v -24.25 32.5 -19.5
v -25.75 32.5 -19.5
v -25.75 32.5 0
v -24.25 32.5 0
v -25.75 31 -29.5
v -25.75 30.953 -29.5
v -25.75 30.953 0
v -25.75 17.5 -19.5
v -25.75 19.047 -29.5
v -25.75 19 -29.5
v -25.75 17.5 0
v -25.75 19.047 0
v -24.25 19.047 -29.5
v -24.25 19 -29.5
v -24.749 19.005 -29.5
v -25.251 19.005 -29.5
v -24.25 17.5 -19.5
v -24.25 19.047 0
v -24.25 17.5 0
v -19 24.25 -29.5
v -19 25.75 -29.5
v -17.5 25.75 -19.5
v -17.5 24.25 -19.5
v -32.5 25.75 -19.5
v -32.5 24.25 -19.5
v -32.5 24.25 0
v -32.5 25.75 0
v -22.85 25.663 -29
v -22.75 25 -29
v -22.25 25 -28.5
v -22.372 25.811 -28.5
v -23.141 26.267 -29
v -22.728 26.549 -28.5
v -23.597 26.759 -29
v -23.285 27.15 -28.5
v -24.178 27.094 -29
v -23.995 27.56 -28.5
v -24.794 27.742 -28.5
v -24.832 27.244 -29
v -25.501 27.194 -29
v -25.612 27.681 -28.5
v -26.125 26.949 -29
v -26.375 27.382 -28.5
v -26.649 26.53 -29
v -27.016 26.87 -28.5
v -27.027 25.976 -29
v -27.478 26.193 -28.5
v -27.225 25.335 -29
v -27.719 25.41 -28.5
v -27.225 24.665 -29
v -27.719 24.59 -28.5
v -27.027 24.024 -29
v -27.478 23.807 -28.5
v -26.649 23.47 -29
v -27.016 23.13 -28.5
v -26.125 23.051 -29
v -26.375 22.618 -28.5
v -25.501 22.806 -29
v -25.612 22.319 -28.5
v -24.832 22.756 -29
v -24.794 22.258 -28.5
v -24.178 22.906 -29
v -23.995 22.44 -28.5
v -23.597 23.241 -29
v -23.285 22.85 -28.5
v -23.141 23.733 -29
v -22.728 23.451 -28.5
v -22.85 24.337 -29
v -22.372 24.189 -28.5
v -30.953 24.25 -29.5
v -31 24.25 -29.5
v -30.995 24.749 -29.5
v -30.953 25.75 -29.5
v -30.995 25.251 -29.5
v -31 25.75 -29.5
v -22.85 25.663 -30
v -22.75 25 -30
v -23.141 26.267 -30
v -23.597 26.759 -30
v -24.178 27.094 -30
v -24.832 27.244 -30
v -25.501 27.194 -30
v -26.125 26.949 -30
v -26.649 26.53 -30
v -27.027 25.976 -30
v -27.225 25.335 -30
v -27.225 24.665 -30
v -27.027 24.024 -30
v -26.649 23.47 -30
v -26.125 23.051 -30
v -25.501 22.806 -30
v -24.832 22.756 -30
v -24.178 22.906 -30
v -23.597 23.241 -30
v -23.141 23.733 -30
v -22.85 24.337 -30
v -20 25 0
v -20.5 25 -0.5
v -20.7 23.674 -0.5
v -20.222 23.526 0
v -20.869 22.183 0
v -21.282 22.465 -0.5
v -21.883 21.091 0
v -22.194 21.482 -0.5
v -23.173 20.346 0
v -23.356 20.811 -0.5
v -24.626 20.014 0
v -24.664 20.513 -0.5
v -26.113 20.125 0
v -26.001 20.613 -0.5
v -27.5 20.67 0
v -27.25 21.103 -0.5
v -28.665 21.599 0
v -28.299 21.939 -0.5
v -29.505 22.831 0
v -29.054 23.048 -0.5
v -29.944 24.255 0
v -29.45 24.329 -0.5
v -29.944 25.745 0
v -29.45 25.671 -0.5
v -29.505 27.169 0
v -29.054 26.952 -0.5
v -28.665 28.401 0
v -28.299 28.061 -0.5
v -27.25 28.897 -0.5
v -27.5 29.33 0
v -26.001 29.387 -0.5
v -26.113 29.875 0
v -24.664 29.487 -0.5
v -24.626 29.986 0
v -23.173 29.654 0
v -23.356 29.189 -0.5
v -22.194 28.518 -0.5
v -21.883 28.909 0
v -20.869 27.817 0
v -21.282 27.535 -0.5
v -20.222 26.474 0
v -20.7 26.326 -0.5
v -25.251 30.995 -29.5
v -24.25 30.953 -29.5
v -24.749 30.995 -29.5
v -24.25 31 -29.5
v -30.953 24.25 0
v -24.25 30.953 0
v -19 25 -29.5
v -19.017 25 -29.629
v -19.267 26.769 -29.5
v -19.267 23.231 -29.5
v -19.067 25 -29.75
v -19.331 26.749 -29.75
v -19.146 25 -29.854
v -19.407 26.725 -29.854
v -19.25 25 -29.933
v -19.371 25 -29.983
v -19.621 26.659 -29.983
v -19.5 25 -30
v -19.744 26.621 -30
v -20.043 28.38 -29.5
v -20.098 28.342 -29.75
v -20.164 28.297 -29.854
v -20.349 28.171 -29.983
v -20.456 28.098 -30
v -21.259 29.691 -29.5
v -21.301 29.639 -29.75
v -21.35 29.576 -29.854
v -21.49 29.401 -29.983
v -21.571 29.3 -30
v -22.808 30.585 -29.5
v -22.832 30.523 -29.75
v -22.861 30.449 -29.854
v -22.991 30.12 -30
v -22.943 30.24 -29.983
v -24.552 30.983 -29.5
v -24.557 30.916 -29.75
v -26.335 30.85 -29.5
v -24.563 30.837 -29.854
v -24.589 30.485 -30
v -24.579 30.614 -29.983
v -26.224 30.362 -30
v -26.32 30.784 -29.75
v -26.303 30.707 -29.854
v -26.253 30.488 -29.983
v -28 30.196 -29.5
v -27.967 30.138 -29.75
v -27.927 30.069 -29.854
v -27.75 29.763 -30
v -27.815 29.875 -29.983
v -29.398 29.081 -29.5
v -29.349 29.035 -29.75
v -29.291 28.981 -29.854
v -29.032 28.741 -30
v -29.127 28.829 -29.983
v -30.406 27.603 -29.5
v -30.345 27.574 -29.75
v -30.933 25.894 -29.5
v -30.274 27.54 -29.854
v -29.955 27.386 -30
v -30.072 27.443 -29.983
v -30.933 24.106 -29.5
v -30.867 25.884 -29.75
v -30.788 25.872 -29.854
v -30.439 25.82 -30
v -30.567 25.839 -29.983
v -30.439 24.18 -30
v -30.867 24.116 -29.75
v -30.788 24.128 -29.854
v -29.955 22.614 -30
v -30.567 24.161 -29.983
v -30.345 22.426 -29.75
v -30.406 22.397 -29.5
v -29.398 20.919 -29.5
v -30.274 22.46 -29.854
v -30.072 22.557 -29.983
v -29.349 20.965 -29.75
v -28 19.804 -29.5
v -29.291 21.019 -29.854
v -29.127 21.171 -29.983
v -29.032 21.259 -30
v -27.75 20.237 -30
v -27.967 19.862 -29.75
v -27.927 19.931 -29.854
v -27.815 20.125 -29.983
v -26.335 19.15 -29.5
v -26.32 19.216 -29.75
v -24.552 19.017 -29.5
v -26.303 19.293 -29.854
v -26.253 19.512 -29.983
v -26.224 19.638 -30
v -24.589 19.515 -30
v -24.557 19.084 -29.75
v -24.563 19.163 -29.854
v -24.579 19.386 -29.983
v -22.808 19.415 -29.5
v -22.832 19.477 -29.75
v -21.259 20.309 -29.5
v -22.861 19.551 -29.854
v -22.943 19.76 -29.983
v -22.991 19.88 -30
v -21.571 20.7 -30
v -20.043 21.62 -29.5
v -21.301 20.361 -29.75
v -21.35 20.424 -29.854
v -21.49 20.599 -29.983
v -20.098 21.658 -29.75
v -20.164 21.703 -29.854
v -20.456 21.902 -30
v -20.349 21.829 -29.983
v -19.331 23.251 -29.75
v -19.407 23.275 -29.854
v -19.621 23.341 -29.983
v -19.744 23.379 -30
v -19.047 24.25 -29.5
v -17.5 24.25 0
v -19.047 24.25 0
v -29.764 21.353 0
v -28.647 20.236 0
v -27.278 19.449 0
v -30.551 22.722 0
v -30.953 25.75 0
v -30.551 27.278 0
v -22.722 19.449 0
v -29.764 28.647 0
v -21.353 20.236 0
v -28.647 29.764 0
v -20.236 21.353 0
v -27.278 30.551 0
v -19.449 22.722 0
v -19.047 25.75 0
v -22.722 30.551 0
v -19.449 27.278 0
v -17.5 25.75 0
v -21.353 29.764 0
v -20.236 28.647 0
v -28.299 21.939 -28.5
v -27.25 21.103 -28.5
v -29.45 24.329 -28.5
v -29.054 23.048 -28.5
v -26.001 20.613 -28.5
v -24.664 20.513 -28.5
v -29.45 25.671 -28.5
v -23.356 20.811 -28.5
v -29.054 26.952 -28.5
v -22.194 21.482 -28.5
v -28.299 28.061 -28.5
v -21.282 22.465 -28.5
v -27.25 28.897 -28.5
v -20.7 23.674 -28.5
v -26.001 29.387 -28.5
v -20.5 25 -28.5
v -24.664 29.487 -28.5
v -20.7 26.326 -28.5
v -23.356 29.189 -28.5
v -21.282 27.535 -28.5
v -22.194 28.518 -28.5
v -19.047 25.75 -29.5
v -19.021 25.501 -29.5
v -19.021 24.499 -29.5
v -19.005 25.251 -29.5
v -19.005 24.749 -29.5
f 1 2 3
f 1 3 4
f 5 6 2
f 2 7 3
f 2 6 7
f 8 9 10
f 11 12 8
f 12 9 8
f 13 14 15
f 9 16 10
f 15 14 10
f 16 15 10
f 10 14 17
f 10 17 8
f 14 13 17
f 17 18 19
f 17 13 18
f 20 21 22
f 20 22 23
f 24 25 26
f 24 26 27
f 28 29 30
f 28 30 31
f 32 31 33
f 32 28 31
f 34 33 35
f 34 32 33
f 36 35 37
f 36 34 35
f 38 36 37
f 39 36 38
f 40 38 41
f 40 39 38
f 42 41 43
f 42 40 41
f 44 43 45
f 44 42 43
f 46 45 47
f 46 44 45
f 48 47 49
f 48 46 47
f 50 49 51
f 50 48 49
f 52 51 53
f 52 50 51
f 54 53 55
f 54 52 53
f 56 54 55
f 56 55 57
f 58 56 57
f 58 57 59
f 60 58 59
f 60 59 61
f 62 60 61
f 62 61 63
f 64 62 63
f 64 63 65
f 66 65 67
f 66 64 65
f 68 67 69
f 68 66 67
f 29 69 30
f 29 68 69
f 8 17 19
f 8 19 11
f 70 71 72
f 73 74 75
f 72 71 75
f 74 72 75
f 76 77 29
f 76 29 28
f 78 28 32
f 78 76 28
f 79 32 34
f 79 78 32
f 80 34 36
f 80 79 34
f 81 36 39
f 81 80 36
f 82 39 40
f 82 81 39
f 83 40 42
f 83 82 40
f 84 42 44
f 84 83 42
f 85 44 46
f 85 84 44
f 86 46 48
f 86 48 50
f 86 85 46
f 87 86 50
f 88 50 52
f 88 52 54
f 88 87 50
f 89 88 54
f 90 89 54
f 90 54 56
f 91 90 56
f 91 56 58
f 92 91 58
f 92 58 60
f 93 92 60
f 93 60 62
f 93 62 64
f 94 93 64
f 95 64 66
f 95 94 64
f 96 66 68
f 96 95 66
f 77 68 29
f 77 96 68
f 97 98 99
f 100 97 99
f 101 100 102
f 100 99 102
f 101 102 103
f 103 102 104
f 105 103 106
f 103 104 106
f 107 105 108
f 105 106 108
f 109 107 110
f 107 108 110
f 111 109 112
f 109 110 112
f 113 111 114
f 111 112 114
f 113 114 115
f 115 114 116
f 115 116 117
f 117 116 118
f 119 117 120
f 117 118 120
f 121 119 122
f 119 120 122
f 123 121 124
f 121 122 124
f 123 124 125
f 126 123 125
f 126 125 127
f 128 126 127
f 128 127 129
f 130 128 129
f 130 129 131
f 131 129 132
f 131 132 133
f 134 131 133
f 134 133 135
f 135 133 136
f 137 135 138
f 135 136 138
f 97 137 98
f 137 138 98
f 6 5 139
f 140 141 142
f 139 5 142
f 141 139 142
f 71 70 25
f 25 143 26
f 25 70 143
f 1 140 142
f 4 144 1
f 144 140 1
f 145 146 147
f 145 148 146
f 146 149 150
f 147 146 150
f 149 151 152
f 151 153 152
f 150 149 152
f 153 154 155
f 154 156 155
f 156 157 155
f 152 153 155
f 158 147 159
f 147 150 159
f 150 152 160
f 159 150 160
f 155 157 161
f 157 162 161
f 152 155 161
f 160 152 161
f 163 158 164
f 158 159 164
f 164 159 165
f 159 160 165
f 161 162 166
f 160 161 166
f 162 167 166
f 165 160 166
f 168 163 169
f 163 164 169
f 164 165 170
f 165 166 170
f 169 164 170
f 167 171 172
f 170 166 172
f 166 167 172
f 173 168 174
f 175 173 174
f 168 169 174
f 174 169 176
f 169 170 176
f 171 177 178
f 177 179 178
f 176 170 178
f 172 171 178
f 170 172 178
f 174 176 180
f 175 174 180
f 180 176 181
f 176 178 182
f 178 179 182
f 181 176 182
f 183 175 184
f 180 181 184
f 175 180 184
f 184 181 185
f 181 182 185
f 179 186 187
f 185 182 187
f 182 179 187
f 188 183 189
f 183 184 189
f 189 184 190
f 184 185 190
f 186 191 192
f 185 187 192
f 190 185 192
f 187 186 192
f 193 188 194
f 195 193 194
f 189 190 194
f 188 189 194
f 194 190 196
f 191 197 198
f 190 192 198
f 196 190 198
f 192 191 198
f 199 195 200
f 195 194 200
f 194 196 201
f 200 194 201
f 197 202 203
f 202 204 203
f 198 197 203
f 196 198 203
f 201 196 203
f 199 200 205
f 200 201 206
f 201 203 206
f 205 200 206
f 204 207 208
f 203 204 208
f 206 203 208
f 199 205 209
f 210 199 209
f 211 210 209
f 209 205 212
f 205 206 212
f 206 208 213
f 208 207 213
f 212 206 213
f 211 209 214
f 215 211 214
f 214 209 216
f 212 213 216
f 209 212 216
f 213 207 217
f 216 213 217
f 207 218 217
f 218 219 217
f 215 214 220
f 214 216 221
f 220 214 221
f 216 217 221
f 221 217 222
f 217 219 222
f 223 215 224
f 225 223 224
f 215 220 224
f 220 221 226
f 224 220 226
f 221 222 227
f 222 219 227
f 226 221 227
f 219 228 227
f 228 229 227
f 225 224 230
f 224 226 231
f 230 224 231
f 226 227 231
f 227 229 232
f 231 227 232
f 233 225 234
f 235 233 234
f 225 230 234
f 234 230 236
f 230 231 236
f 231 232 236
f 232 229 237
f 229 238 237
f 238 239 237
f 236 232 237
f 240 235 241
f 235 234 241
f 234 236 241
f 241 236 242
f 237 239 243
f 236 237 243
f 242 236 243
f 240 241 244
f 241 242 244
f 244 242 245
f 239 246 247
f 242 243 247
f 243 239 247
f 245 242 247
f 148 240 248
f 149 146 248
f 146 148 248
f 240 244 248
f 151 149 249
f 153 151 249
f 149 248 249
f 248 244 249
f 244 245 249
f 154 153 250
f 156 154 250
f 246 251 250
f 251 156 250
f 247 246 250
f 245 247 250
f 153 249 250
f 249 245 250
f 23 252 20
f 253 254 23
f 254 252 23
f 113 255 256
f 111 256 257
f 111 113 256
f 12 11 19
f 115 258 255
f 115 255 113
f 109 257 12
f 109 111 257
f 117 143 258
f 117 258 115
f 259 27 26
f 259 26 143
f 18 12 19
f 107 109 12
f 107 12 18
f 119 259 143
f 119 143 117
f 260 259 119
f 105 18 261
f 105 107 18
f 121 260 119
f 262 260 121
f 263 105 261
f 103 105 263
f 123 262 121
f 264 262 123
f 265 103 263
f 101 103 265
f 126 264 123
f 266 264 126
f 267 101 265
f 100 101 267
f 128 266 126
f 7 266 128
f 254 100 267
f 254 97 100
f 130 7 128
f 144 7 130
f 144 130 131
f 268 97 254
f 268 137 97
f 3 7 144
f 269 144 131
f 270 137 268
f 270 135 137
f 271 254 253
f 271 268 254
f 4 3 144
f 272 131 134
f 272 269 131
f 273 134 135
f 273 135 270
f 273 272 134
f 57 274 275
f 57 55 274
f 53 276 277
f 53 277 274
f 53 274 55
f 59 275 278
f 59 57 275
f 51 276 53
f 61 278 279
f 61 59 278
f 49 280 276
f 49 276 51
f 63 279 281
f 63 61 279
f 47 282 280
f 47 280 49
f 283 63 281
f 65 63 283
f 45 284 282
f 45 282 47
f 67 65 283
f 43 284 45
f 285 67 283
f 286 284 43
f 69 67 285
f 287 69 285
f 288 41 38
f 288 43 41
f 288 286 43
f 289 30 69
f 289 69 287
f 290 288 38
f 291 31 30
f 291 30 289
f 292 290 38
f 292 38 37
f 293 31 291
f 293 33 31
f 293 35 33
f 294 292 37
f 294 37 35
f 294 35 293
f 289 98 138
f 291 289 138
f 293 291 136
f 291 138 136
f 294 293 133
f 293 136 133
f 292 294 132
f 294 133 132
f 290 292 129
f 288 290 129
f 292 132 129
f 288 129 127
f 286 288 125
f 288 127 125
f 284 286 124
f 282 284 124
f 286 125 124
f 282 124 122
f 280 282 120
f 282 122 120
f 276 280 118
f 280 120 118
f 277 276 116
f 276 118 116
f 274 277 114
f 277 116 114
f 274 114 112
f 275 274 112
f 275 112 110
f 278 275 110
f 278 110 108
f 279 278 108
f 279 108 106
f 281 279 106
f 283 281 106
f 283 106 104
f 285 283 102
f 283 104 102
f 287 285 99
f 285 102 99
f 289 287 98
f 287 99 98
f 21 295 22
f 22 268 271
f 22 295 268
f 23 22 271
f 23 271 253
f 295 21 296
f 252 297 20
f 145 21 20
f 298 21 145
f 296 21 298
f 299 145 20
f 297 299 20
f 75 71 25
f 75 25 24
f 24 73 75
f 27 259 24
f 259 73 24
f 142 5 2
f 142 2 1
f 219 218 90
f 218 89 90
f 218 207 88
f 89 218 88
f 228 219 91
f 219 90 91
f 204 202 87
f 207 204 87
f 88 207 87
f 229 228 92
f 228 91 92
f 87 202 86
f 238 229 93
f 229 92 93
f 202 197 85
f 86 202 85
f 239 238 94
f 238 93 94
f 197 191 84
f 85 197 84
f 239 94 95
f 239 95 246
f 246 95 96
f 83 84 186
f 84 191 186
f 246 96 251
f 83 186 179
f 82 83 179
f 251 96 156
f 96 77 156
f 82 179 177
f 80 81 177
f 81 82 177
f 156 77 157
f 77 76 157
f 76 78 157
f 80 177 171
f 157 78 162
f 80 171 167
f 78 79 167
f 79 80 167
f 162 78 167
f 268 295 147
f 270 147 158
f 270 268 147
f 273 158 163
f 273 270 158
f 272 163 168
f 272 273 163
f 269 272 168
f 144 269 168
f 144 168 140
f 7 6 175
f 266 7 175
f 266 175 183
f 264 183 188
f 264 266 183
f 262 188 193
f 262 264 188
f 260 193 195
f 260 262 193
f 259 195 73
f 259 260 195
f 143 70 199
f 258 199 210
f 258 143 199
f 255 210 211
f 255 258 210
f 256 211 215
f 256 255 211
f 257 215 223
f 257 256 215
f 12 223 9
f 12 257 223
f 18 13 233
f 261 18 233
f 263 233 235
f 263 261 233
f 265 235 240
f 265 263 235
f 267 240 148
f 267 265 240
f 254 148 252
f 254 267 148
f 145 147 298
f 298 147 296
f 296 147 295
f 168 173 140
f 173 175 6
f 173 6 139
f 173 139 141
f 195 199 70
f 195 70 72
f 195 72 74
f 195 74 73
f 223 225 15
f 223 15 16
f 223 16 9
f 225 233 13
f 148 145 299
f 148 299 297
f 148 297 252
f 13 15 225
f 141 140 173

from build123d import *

# Parameters (mm, degrees)
F1_R        = 6
F1_R_2      = 4.5
F2_DEPTH    = 30
F4_W        = 1.5
F4_H        = 2.639524132
F5_DEPTH    = 29.5
F6_COUNT    = 4
F8_R        = 4.5
F8_R_2      = 2.25
F9_DEPTH    = 1.5
F10_SIZE2   = 1.49999
F10_SIZE    = 9.99999
F10_2_SIZE2 = 1.49999
F10_2_SIZE  = 9.99999
F10_3_SIZE2 = 1.49999
F10_3_SIZE  = 9.99999
F10_4_SIZE2 = 1.49999
F10_4_SIZE  = 9.99999
F11_SIZE    = 0.5
F12_R       = 0.49999


# Not quite as in the source:
# - a fillet or chamfer is up to 0.001 mm smaller than in the source, because OpenCascade refuses the exact size


with BuildPart() as f2:
    # F1 (on offset) → F2 (new body)
    with BuildSketch(Plane.XY):
        with Locations((-25, 25)):
            Circle(F1_R)
        with Locations((-25, 25)):
            Circle(F1_R_2, mode=Mode.SUBTRACT)
    extrude(amount=-F2_DEPTH)

    # F4 (on offset) → F5 (join)
    with BuildSketch(Plane.XY):
        with Locations((-25, 31.180237934)):
            Rectangle(F4_W, F4_H)
    extrude(amount=-F5_DEPTH)

    # F6: F2 ×4 about axis
    f6_axis = Axis((-25, 25, 0), (0, 0, 1))


with BuildPart() as f2_1:
    add(f2.part)
    for i in range(1, F6_COUNT):
        add(f2.part.rotate(f6_axis, i * 360 / F6_COUNT))

    # F8 (on offset) → F9 (join)
    with BuildSketch(Plane.XY.offset(-30)):
        with Locations((-25, 25)):
            Circle(F8_R)
        with Locations((-25, 25)):
            Circle(F8_R_2, mode=Mode.SUBTRACT)
    extrude(amount=F9_DEPTH)

    # F10 (size 10 and 1.5 in the source; OpenCascade refuses exactly that, so slightly less here)
    f10_edges = [f2_1.edges().sort_by_distance(p)[0] for p in [
        (-25, 17.5, -29.5),
    ]]
    f10_side = f2_1.faces().sort_by_distance((-25, 17.5, -14.75))[0]
    chamfer(f10_edges, length=F10_SIZE, length2=F10_SIZE2, reference=f10_side)

    # F10#2 (size 10 and 1.5 in the source; OpenCascade refuses exactly that, so slightly less here)
    f10_2_edges = [f2_1.edges().sort_by_distance(p)[0] for p in [
        (-17.5, 25, -29.5),
    ]]
    f10_2_side = f2_1.faces().sort_by_distance((-17.5, 25, -14.75))[0]
    chamfer(f10_2_edges, length=F10_2_SIZE, length2=F10_2_SIZE2, reference=f10_2_side)

    # F10#3 (size 10 and 1.5 in the source; OpenCascade refuses exactly that, so slightly less here)
    f10_3_edges = [f2_1.edges().sort_by_distance(p)[0] for p in [
        (-25, 32.5, -29.5),
    ]]
    f10_3_side = f2_1.faces().sort_by_distance((-25, 32.5, -14.75))[0]
    chamfer(f10_3_edges, length=F10_3_SIZE, length2=F10_3_SIZE2, reference=f10_3_side)

    # F10#4 (size 10 and 1.5 in the source; OpenCascade refuses exactly that, so slightly less here)
    f10_4_edges = [f2_1.edges().sort_by_distance(p)[0] for p in [
        (-32.5, 25, -29.5),
    ]]
    f10_4_side = f2_1.faces().sort_by_distance((-32.5, 25, -14.75))[0]
    chamfer(f10_4_edges, length=F10_4_SIZE, length2=F10_4_SIZE2, reference=f10_4_side)

    # F11
    f11_edges = [f2_1.edges().sort_by_distance(p)[0] for p in [
        (-29.5, 25, 0),
        (-27.25, 25, -28.5),
    ]]
    chamfer(f11_edges, length=F11_SIZE)

    # F12 (radius 0.5 in the source; OpenCascade refuses exactly that, so slightly less here)
    f12_edges = [f2_1.edges().sort_by_distance(p)[0] for p in [
        (-31, 25, -30),
    ]]
    fillet(f12_edges, radius=F12_R)


solid = f2_1.part
